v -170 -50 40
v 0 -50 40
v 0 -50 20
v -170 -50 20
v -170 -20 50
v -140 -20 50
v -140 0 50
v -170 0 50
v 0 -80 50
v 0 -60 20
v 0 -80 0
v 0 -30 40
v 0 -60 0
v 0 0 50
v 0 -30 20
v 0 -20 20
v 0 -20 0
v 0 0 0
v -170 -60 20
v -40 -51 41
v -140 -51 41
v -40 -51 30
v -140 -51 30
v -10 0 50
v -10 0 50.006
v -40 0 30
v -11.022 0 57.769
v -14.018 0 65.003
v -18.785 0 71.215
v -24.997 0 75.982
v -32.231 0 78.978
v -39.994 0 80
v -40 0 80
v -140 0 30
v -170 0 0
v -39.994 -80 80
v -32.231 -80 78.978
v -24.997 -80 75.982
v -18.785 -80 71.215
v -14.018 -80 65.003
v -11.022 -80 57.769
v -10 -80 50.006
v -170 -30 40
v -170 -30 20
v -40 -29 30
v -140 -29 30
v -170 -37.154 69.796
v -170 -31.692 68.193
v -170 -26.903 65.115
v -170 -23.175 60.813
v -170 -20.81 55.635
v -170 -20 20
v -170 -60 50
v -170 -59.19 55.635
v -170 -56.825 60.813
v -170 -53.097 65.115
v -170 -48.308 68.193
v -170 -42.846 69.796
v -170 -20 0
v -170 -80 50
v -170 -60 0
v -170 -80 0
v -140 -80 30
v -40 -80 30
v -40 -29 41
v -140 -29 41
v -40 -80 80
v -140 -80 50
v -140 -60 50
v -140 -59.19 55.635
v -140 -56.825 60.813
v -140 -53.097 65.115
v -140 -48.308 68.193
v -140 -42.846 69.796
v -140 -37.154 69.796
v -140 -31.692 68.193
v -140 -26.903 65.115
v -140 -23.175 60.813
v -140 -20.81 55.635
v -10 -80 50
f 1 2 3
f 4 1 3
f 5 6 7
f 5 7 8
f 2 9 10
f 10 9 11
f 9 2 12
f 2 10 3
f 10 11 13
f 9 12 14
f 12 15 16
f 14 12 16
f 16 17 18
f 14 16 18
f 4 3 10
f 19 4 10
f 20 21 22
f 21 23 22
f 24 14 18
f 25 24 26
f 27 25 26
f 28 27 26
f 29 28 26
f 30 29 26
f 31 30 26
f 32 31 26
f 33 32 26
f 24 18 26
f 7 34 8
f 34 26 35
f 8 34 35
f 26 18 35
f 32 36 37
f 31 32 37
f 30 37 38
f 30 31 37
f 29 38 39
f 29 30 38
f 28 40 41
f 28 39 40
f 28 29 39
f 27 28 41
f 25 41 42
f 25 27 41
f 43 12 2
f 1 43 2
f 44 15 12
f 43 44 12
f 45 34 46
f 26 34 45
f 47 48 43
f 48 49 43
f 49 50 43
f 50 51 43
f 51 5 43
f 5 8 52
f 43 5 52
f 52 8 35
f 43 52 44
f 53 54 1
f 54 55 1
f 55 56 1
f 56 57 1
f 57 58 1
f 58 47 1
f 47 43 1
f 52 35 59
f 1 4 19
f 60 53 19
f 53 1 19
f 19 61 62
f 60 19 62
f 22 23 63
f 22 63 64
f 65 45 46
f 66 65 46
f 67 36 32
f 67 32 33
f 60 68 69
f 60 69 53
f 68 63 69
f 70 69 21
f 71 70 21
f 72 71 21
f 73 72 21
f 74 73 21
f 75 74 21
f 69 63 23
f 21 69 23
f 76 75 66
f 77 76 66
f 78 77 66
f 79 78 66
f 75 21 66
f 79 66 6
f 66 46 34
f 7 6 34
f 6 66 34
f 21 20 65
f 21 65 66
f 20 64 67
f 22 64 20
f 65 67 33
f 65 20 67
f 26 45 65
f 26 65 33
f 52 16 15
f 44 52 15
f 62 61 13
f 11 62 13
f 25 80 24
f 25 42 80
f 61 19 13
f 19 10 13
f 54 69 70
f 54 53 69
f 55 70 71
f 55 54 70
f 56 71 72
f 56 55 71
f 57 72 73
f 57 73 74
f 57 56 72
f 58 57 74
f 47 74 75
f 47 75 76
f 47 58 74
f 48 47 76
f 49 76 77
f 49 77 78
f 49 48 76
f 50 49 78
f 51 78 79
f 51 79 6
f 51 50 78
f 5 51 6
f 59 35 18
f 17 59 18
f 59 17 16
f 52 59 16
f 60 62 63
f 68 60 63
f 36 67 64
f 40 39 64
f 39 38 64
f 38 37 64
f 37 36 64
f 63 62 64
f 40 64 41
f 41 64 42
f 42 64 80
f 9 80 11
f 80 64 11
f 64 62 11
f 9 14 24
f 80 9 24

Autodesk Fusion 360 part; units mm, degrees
sketch "Sketch1" plane through (0, 0, 0) normal (0, 0, 1) x (1, 0, 0)
  line L0 (0, 0) -> (-170, 0)
  line L1 (-170, 0) -> (-170, -80)
  line L2 (-170, -80) -> (0, -80)
  line L3 (0, -80) -> (0, 0)
  dimension "d1" = 170
  dimension "d2" = 80
extrude "Extrude1" add sketch "Sketch1" along normal blind 30
sketch "Sketch2" plane through (0, 0, 30) normal (0, 0, 1) x (-1, 0, 0)
  line L0 (0, 80) -> (0, 0)
  line L1 (0, 0) -> (170, 0)
  line L2 (170, 0) -> (170, 80)
  line L3 (170, 80) -> (0, 80)
  line L4 (0, 80) -> (40, 80)
  line L5 (40, 80) -> (40, 0)
  line L6 (40, 0) -> (0, 0)
  line L7 (0, 0) -> (0, 80)
  dimension "d5" = 40
extrude "Extrude2" add sketch "Sketch2" along normal blind 50 contours L0 L1 L3 L4 L5 L6 L7
sketch "Sketch3" plane through (0, 0, 80) normal (0, 0, 1) x (-1, 0, 0)
  line L0 (0, 0) -> (40, 0)
  line L1 (40, 0) -> (40, 80)
  line L2 (40, 80) -> (0, 80)
  line L3 (0, 80) -> (0, 0)
  line L4 (0, 80) -> (10, 80)
  line L5 (10, 80) -> (10, 0)
  line L6 (10, 0) -> (0, 0)
  line L7 (0, 0) -> (0, 80)
extrude "Extrude3" cut sketch "Sketch3" along normal blind 0 and the other way blind 30 contours L0 L2 L3 L4 L5 L6 L7
fillet "Fillet1" radius 30 1 edges at (-10, -40, 80)
sketch "Sketch4" plane through (0, 0, 30) normal (0, 0, 1) x (-1, 0, 0)
  line L0 (40, 80) -> (40, 0)
  line L1 (40, 0) -> (170, 0)
  line L2 (170, 0) -> (170, 80)
  line L3 (170, 80) -> (40, 80)
  line L4 (170, 80) -> (140, 80)
  line L5 (140, 80) -> (140, 0)
  line L6 (140, 0) -> (170, 0)
  line L7 (170, 0) -> (170, 80)
extrude "Extrude4" add sketch "Sketch4" along normal blind 20 contours L1 L2 L3 L4 L5 L6 L7
sketch "Sketch5" plane through (-170, 0, 0) normal (-1, 0, 0) x (0, -1, 0)
  line L0 (0, 0) -> (80, 0)
  line L1 (80, 0) -> (80, 50)
  line L2 (80, 50) -> (0, 50)
  line L3 (0, 50) -> (0, 0)
  circle A0 centre (40, 50) radius 20
  dimension "d16" = 40
extrude "Extrude5" add sketch "Sketch5" along normal blind 0 and the other way blind 30 contours L2 A0 picked at (45.5083, 53.7555)
sketch "Sketch6" plane through (0, 0, 30) normal (0, 0, 1) x (-1, 0, 0)
  line L0 (140, 0) -> (140, 80)
  line L1 (140, 80) -> (40, 80)
  line L2 (40, 80) -> (40, 0)
  line L3 (40, 0) -> (140, 0)
  line L4 (140, 50) -> (40, 50)
  line L5 (40, 50) -> (40, 30)
  line L6 (40, 30) -> (140, 30)
  line L7 (140, 30) -> (140, 50)
extrude "Extrude6" add sketch "Sketch6" along normal blind 10 contours L0 L2 L4 L5 L6 L7
sketch "Sketch7" plane through (0, 0, 0) normal (1, 0, 0) x (0, 1, 0)
  line L0 (0, 50) -> (-80, 50)
  line L1 (-80, 50) -> (-80, 0)
  line L2 (-80, 0) -> (0, 0)
  line L3 (0, 0) -> (0, 50)
  line L4 (-60, 0) -> (-20, 0)
  line L5 (-20, 0) -> (-20, 20)
  line L6 (-20, 20) -> (-60, 20)
  line L7 (-60, 20) -> (-60, 0)
  line L8 (-50, 20) -> (-30, 20)
  line L9 (-30, 20) -> (-30, 40)
  line L10 (-30, 40) -> (-50, 40)
  line L11 (-50, 40) -> (-50, 20)
extrude "Extrude7" cut sketch "Sketch7" along normal blind 0 and the other way blind 170 contours L2 L4 L5 L6 L7 L8 | L6 L8 L9 L10 L11
sketch "Sketch8" plane through (0, 0, 30) normal (0, 0, 1) x (-1, 0, 0)
  line L0 (140, 30) -> (40, 30)
  line L1 (40, 30) -> (40, 0)
  line L2 (40, 0) -> (140, 0)
  line L3 (140, 0) -> (140, 30)
  line L4 (40, 30) -> (140, 30)
  line L5 (140, 30) -> (140, 29)
  line L6 (140, 29) -> (40, 29)
  line L7 (40, 29) -> (40, 30)
  line L8 (40, 50) -> (140, 50)
  line L9 (140, 50) -> (140, 51)
  line L10 (140, 51) -> (40, 51)
  line L11 (40, 51) -> (40, 50)
  dimension "d27" = 1
  dimension "d28" = 100
  dimension "d29" = 1
extrude "Extrude8" add sketch "Sketch8" along normal blind 10 contours L0 L1 L3 L4 L5 L6 L7 | L8 L9 L10 L11
sketch "Sketch9" plane through (0, 0, 40) normal (0, 0, 1) x (-1, 0, 0)
  line L0 (40, 29) -> (140, 29)
  line L1 (140, 29) -> (140, 30)
  line L2 (140, 30) -> (40, 30)
  line L3 (40, 30) -> (40, 29)
  line L4 (40, 51) -> (140, 51)
  line L5 (140, 51) -> (140, 29)
  line L6 (140, 29) -> (40, 29)
  line L7 (40, 29) -> (40, 51)
extrude "Extrude9" add sketch "Sketch9" along normal blind 1
